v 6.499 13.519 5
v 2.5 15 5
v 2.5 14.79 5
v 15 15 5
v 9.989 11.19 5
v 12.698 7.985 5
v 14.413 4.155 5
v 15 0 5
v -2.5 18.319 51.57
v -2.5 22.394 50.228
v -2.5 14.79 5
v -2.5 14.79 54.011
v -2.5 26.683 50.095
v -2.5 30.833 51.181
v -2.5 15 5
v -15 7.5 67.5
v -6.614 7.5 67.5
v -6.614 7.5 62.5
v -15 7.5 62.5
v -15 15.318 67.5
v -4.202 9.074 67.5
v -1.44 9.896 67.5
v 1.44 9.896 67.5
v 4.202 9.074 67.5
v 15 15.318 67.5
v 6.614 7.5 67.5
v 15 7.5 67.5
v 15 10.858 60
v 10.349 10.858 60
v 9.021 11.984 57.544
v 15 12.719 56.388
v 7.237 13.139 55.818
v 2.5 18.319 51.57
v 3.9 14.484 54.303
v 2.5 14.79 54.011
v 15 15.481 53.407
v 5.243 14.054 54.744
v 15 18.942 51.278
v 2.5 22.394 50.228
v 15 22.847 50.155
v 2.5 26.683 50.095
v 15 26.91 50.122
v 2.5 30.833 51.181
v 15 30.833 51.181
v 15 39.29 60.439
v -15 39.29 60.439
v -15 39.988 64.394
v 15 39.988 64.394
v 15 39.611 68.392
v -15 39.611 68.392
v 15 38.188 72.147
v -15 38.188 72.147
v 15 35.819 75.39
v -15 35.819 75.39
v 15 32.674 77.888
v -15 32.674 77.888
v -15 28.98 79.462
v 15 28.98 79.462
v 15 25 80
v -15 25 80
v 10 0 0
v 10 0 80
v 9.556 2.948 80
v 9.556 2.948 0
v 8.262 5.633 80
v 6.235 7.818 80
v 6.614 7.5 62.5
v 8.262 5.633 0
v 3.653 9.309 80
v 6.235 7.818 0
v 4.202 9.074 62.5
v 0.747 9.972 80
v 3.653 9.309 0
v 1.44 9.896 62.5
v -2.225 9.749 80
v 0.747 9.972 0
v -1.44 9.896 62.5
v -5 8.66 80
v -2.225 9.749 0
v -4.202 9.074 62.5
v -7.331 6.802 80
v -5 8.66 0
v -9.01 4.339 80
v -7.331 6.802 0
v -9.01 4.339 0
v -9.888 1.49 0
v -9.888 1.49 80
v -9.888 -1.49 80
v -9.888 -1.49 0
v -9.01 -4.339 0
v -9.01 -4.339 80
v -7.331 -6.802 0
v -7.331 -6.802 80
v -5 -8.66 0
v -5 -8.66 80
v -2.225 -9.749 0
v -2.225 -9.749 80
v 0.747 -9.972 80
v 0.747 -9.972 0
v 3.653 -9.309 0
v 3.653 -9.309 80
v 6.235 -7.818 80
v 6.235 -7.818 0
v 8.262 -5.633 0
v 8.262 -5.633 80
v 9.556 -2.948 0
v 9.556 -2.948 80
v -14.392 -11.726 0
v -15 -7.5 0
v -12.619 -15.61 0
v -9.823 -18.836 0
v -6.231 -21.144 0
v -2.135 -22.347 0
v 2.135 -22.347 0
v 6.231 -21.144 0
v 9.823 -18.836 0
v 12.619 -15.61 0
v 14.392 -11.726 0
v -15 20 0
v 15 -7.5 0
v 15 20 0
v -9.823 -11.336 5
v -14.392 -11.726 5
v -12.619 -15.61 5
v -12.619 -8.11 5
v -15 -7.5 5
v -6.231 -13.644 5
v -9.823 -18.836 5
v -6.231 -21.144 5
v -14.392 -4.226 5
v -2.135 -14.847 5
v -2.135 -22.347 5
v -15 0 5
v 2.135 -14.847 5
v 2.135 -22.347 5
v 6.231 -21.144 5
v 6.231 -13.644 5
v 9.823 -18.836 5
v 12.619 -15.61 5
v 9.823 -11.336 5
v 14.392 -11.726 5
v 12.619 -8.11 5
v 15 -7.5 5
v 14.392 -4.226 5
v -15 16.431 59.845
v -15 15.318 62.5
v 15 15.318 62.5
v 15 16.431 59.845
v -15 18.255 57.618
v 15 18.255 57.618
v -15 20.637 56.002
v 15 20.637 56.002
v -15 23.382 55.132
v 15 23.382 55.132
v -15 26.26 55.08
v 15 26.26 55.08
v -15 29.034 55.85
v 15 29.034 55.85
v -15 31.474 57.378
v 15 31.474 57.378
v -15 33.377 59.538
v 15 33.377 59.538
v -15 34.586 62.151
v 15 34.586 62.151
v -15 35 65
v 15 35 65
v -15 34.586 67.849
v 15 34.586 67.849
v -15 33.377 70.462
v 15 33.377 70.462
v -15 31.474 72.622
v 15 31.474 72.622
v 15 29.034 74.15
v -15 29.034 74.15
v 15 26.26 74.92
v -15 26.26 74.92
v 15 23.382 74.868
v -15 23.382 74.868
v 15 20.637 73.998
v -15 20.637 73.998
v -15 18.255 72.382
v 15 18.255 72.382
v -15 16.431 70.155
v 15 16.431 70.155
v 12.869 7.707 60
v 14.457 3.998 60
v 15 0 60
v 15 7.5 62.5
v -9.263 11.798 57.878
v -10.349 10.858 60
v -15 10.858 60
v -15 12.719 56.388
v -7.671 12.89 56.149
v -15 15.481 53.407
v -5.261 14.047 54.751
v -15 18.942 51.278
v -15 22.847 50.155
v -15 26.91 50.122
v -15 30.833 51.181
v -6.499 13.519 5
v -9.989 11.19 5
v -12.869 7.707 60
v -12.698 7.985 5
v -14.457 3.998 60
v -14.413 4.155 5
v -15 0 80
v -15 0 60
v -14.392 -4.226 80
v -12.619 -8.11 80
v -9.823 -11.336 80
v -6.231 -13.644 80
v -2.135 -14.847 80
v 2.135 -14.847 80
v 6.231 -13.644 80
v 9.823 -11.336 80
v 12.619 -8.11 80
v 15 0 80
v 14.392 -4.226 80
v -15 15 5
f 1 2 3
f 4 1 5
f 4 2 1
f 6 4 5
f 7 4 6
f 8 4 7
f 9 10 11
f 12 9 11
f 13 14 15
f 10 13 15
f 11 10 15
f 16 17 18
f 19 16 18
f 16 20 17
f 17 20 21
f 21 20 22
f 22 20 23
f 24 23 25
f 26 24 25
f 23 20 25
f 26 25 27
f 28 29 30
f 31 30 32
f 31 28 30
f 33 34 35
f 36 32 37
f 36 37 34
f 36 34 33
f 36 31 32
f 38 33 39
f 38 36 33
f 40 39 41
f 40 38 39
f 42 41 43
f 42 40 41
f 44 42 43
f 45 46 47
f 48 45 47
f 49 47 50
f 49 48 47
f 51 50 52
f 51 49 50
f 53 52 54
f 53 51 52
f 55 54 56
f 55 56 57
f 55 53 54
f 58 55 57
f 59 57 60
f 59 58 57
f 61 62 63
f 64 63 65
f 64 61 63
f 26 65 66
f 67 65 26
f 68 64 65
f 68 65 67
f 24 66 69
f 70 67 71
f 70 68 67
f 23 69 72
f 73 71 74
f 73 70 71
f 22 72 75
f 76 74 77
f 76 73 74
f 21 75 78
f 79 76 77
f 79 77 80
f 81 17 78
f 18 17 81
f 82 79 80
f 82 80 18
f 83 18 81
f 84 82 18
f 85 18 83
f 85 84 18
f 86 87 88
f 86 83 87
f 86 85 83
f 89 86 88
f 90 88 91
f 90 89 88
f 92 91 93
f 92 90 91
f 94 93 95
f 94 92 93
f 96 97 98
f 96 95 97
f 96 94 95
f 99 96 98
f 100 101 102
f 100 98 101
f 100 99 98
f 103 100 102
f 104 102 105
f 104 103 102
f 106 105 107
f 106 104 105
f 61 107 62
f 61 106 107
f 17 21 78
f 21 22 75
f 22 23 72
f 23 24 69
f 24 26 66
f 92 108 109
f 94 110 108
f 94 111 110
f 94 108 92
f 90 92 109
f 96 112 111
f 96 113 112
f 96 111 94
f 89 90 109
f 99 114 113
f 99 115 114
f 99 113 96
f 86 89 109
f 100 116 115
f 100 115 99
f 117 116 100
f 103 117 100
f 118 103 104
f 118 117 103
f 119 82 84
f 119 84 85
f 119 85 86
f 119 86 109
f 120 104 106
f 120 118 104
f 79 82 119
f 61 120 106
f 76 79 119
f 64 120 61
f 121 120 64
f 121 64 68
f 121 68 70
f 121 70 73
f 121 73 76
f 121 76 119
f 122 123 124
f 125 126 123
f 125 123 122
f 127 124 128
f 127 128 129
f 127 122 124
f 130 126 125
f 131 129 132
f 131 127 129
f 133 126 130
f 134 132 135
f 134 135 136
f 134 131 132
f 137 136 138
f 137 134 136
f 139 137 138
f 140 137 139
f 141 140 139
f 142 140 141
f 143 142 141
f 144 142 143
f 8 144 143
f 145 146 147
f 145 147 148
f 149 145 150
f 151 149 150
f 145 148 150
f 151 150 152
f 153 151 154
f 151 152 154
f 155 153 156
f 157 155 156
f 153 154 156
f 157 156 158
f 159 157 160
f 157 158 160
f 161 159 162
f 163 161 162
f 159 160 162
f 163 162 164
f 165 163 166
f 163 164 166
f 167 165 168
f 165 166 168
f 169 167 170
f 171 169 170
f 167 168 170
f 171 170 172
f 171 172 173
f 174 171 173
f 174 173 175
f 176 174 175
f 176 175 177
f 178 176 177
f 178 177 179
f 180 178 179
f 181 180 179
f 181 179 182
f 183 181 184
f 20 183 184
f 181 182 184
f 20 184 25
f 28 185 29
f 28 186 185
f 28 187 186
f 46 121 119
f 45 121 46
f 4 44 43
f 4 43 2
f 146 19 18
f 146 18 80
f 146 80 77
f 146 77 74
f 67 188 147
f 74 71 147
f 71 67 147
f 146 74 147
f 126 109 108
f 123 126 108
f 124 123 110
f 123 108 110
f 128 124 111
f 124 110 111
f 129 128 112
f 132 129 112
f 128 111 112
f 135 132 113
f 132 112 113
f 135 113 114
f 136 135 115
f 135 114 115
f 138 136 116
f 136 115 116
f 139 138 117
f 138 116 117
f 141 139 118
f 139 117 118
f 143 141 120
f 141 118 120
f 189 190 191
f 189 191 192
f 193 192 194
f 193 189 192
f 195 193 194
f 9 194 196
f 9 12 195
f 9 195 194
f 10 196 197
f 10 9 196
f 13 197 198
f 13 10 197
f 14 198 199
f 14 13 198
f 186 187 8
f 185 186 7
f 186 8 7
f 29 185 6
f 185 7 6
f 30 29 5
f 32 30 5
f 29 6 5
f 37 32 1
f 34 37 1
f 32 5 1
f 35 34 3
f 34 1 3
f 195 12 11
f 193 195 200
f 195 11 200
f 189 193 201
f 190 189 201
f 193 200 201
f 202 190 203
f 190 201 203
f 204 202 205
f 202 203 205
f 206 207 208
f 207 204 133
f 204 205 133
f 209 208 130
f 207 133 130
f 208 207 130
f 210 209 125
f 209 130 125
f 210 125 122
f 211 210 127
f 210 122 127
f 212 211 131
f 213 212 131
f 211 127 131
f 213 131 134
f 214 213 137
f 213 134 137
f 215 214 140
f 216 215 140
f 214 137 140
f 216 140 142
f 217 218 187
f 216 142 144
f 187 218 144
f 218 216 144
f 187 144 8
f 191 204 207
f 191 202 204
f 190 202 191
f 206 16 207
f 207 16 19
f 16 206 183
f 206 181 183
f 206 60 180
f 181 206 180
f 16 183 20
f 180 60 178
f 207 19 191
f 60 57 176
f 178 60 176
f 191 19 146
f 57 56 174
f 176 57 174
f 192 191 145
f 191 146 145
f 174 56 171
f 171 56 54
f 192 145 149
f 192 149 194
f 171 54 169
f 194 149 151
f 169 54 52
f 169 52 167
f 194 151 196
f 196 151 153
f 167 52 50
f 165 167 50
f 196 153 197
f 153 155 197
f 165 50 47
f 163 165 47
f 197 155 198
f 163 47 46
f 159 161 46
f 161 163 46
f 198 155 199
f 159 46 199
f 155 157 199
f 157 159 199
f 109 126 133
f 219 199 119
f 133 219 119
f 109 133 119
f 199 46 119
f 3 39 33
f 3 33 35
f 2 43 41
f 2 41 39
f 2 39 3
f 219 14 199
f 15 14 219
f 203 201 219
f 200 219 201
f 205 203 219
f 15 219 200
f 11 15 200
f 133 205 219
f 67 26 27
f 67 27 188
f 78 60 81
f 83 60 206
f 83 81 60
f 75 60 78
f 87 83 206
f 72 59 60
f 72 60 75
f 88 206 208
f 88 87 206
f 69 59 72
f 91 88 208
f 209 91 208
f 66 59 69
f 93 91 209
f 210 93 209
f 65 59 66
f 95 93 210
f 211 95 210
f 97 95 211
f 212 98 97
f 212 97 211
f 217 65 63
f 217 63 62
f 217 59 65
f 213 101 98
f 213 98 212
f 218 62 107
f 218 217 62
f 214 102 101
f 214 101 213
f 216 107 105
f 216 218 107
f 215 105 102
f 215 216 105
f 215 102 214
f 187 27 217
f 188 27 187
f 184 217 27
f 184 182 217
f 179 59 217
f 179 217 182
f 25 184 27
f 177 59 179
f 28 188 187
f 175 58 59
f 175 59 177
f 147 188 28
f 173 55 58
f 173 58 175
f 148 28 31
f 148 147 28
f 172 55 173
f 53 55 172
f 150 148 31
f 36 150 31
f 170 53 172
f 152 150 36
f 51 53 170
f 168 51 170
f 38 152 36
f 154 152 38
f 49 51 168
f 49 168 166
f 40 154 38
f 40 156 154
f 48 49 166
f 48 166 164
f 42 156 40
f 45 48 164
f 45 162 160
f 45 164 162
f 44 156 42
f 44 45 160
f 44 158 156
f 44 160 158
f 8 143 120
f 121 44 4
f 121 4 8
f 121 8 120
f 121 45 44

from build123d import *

# Parameters (mm, degrees)
SKETCH1_R            = 10
BOSS_EXTRUDE1_DEPTH  = 80
BOSS_EXTRUDE2_DEPTH  = 5
BOSS_EXTRUDE3_DEPTH  = 15
BOSS_EXTRUDE21_DEPTH = 2.5
CUT_EXTRUDE1_DEPTH   = 15
SKETCH1_4_R          = 10
CUT_EXTRUDE2_DEPTH   = 80


with BuildPart() as part:
    # Sketch1 → Boss-Extrude1 (new body)
    with BuildSketch(Plane.XY):
        with BuildLine():
            ThreePointArc((15, 0), (0, 15), (-15, 0))
            ThreePointArc((-15, 0), (0, -15), (15, 0))
        make_face()
        Circle(SKETCH1_R, mode=Mode.SUBTRACT)
    extrude(amount=BOSS_EXTRUDE1_DEPTH)

    # Sketch1<3> → Boss-Extrude2 (add)
    with BuildSketch(Plane.XY):
        with BuildLine():
            Line((-15, 0), (-15, -7.5))
            ThreePointArc((-15, -7.5), (0, -22.5), (15, -7.5))
            Line((15, -7.5), (15, 0))
            ThreePointArc((15, 0), (0, -15), (-15, 0))
        make_face()
    extrude(amount=BOSS_EXTRUDE2_DEPTH)

    # Sketch2 → Boss-Extrude3 (add, symmetric)
    with BuildSketch(Plane(origin=(0, 0, 0), x_dir=(0, 0, -1), z_dir=(1, 0, 0))):
        with BuildLine():
            ThreePointArc((-60.439243158, 39.289838943), (-73.848407975, 37.112211867), (-80, 25))
            Line((-80, 25), (-80, 0))
            Line((-80, 0), (-60, 0))
            Line((-60, 0), (-60, 10))
            Line((-60, 10), (-60, 10.857864376))
            ThreePointArc((-60, 10.857864376), (-51.277883135, 18.941657921), (-51.180759566, 30.83340328))
            Line((-51.180759566, 30.83340328), (-5, 15))
            Line((-5, 15), (-5, 10))
            Line((-5, 10), (-5, 0))
            Line((-5, 0), (0, 0))
            Line((0, 0), (0, 15))
            Line((0, 15), (0, 20))
            Line((0, 20), (-60.439243158, 39.289838943))
        make_face()
        with BuildLine():
            Line((-67.5, 7.5), (-67.5, 15.317541634))
            ThreePointArc((-67.5, 15.317541634), (-65, 35), (-62.5, 15.317541634))
            Line((-62.5, 15.317541634), (-62.5, 7.5))
            Line((-62.5, 7.5), (-67.5, 7.5))
        make_face(mode=Mode.SUBTRACT)
    extrude(amount=BOSS_EXTRUDE3_DEPTH, both=True)

    # Sketch2<8> → Boss-Extrude21 (add, symmetric)
    with BuildSketch(Plane(origin=(0, 0, 0), x_dir=(0, 0, -1), z_dir=(1, 0, 0))):
        with BuildLine():
            Line((-60, 10.857864376), (-60, 10))
            Line((-60, 10), (-5, 10))
            Line((-5, 10), (-5, 15))
            Line((-5, 15), (-51.180759566, 30.83340328))
            ThreePointArc((-51.180759566, 30.83340328), (-51.277883135, 18.941657921), (-60, 10.857864376))
        make_face()
    extrude(amount=BOSS_EXTRUDE21_DEPTH, both=True)

    # Sketch2<9> → Cut-Extrude1 (cut, symmetric)
    with BuildSketch(Plane(origin=(0, 0, 0), x_dir=(0, 0, -1), z_dir=(1, 0, 0))):
        with BuildLine():
            ThreePointArc((-62.5, 15.317541634), (-65, 35), (-67.5, 15.317541634))
            Line((-67.5, 15.317541634), (-67.5, 7.5))
            Line((-67.5, 7.5), (-62.5, 7.5))
            Line((-62.5, 7.5), (-62.5, 15.317541634))
        make_face()
    extrude(amount=CUT_EXTRUDE1_DEPTH, both=True, mode=Mode.SUBTRACT)

    # Sketch1<4> → Cut-Extrude2 (cut)
    with BuildSketch(Plane.XY):
        Circle(SKETCH1_4_R)
    extrude(amount=CUT_EXTRUDE2_DEPTH, mode=Mode.SUBTRACT)


solid = part.part
